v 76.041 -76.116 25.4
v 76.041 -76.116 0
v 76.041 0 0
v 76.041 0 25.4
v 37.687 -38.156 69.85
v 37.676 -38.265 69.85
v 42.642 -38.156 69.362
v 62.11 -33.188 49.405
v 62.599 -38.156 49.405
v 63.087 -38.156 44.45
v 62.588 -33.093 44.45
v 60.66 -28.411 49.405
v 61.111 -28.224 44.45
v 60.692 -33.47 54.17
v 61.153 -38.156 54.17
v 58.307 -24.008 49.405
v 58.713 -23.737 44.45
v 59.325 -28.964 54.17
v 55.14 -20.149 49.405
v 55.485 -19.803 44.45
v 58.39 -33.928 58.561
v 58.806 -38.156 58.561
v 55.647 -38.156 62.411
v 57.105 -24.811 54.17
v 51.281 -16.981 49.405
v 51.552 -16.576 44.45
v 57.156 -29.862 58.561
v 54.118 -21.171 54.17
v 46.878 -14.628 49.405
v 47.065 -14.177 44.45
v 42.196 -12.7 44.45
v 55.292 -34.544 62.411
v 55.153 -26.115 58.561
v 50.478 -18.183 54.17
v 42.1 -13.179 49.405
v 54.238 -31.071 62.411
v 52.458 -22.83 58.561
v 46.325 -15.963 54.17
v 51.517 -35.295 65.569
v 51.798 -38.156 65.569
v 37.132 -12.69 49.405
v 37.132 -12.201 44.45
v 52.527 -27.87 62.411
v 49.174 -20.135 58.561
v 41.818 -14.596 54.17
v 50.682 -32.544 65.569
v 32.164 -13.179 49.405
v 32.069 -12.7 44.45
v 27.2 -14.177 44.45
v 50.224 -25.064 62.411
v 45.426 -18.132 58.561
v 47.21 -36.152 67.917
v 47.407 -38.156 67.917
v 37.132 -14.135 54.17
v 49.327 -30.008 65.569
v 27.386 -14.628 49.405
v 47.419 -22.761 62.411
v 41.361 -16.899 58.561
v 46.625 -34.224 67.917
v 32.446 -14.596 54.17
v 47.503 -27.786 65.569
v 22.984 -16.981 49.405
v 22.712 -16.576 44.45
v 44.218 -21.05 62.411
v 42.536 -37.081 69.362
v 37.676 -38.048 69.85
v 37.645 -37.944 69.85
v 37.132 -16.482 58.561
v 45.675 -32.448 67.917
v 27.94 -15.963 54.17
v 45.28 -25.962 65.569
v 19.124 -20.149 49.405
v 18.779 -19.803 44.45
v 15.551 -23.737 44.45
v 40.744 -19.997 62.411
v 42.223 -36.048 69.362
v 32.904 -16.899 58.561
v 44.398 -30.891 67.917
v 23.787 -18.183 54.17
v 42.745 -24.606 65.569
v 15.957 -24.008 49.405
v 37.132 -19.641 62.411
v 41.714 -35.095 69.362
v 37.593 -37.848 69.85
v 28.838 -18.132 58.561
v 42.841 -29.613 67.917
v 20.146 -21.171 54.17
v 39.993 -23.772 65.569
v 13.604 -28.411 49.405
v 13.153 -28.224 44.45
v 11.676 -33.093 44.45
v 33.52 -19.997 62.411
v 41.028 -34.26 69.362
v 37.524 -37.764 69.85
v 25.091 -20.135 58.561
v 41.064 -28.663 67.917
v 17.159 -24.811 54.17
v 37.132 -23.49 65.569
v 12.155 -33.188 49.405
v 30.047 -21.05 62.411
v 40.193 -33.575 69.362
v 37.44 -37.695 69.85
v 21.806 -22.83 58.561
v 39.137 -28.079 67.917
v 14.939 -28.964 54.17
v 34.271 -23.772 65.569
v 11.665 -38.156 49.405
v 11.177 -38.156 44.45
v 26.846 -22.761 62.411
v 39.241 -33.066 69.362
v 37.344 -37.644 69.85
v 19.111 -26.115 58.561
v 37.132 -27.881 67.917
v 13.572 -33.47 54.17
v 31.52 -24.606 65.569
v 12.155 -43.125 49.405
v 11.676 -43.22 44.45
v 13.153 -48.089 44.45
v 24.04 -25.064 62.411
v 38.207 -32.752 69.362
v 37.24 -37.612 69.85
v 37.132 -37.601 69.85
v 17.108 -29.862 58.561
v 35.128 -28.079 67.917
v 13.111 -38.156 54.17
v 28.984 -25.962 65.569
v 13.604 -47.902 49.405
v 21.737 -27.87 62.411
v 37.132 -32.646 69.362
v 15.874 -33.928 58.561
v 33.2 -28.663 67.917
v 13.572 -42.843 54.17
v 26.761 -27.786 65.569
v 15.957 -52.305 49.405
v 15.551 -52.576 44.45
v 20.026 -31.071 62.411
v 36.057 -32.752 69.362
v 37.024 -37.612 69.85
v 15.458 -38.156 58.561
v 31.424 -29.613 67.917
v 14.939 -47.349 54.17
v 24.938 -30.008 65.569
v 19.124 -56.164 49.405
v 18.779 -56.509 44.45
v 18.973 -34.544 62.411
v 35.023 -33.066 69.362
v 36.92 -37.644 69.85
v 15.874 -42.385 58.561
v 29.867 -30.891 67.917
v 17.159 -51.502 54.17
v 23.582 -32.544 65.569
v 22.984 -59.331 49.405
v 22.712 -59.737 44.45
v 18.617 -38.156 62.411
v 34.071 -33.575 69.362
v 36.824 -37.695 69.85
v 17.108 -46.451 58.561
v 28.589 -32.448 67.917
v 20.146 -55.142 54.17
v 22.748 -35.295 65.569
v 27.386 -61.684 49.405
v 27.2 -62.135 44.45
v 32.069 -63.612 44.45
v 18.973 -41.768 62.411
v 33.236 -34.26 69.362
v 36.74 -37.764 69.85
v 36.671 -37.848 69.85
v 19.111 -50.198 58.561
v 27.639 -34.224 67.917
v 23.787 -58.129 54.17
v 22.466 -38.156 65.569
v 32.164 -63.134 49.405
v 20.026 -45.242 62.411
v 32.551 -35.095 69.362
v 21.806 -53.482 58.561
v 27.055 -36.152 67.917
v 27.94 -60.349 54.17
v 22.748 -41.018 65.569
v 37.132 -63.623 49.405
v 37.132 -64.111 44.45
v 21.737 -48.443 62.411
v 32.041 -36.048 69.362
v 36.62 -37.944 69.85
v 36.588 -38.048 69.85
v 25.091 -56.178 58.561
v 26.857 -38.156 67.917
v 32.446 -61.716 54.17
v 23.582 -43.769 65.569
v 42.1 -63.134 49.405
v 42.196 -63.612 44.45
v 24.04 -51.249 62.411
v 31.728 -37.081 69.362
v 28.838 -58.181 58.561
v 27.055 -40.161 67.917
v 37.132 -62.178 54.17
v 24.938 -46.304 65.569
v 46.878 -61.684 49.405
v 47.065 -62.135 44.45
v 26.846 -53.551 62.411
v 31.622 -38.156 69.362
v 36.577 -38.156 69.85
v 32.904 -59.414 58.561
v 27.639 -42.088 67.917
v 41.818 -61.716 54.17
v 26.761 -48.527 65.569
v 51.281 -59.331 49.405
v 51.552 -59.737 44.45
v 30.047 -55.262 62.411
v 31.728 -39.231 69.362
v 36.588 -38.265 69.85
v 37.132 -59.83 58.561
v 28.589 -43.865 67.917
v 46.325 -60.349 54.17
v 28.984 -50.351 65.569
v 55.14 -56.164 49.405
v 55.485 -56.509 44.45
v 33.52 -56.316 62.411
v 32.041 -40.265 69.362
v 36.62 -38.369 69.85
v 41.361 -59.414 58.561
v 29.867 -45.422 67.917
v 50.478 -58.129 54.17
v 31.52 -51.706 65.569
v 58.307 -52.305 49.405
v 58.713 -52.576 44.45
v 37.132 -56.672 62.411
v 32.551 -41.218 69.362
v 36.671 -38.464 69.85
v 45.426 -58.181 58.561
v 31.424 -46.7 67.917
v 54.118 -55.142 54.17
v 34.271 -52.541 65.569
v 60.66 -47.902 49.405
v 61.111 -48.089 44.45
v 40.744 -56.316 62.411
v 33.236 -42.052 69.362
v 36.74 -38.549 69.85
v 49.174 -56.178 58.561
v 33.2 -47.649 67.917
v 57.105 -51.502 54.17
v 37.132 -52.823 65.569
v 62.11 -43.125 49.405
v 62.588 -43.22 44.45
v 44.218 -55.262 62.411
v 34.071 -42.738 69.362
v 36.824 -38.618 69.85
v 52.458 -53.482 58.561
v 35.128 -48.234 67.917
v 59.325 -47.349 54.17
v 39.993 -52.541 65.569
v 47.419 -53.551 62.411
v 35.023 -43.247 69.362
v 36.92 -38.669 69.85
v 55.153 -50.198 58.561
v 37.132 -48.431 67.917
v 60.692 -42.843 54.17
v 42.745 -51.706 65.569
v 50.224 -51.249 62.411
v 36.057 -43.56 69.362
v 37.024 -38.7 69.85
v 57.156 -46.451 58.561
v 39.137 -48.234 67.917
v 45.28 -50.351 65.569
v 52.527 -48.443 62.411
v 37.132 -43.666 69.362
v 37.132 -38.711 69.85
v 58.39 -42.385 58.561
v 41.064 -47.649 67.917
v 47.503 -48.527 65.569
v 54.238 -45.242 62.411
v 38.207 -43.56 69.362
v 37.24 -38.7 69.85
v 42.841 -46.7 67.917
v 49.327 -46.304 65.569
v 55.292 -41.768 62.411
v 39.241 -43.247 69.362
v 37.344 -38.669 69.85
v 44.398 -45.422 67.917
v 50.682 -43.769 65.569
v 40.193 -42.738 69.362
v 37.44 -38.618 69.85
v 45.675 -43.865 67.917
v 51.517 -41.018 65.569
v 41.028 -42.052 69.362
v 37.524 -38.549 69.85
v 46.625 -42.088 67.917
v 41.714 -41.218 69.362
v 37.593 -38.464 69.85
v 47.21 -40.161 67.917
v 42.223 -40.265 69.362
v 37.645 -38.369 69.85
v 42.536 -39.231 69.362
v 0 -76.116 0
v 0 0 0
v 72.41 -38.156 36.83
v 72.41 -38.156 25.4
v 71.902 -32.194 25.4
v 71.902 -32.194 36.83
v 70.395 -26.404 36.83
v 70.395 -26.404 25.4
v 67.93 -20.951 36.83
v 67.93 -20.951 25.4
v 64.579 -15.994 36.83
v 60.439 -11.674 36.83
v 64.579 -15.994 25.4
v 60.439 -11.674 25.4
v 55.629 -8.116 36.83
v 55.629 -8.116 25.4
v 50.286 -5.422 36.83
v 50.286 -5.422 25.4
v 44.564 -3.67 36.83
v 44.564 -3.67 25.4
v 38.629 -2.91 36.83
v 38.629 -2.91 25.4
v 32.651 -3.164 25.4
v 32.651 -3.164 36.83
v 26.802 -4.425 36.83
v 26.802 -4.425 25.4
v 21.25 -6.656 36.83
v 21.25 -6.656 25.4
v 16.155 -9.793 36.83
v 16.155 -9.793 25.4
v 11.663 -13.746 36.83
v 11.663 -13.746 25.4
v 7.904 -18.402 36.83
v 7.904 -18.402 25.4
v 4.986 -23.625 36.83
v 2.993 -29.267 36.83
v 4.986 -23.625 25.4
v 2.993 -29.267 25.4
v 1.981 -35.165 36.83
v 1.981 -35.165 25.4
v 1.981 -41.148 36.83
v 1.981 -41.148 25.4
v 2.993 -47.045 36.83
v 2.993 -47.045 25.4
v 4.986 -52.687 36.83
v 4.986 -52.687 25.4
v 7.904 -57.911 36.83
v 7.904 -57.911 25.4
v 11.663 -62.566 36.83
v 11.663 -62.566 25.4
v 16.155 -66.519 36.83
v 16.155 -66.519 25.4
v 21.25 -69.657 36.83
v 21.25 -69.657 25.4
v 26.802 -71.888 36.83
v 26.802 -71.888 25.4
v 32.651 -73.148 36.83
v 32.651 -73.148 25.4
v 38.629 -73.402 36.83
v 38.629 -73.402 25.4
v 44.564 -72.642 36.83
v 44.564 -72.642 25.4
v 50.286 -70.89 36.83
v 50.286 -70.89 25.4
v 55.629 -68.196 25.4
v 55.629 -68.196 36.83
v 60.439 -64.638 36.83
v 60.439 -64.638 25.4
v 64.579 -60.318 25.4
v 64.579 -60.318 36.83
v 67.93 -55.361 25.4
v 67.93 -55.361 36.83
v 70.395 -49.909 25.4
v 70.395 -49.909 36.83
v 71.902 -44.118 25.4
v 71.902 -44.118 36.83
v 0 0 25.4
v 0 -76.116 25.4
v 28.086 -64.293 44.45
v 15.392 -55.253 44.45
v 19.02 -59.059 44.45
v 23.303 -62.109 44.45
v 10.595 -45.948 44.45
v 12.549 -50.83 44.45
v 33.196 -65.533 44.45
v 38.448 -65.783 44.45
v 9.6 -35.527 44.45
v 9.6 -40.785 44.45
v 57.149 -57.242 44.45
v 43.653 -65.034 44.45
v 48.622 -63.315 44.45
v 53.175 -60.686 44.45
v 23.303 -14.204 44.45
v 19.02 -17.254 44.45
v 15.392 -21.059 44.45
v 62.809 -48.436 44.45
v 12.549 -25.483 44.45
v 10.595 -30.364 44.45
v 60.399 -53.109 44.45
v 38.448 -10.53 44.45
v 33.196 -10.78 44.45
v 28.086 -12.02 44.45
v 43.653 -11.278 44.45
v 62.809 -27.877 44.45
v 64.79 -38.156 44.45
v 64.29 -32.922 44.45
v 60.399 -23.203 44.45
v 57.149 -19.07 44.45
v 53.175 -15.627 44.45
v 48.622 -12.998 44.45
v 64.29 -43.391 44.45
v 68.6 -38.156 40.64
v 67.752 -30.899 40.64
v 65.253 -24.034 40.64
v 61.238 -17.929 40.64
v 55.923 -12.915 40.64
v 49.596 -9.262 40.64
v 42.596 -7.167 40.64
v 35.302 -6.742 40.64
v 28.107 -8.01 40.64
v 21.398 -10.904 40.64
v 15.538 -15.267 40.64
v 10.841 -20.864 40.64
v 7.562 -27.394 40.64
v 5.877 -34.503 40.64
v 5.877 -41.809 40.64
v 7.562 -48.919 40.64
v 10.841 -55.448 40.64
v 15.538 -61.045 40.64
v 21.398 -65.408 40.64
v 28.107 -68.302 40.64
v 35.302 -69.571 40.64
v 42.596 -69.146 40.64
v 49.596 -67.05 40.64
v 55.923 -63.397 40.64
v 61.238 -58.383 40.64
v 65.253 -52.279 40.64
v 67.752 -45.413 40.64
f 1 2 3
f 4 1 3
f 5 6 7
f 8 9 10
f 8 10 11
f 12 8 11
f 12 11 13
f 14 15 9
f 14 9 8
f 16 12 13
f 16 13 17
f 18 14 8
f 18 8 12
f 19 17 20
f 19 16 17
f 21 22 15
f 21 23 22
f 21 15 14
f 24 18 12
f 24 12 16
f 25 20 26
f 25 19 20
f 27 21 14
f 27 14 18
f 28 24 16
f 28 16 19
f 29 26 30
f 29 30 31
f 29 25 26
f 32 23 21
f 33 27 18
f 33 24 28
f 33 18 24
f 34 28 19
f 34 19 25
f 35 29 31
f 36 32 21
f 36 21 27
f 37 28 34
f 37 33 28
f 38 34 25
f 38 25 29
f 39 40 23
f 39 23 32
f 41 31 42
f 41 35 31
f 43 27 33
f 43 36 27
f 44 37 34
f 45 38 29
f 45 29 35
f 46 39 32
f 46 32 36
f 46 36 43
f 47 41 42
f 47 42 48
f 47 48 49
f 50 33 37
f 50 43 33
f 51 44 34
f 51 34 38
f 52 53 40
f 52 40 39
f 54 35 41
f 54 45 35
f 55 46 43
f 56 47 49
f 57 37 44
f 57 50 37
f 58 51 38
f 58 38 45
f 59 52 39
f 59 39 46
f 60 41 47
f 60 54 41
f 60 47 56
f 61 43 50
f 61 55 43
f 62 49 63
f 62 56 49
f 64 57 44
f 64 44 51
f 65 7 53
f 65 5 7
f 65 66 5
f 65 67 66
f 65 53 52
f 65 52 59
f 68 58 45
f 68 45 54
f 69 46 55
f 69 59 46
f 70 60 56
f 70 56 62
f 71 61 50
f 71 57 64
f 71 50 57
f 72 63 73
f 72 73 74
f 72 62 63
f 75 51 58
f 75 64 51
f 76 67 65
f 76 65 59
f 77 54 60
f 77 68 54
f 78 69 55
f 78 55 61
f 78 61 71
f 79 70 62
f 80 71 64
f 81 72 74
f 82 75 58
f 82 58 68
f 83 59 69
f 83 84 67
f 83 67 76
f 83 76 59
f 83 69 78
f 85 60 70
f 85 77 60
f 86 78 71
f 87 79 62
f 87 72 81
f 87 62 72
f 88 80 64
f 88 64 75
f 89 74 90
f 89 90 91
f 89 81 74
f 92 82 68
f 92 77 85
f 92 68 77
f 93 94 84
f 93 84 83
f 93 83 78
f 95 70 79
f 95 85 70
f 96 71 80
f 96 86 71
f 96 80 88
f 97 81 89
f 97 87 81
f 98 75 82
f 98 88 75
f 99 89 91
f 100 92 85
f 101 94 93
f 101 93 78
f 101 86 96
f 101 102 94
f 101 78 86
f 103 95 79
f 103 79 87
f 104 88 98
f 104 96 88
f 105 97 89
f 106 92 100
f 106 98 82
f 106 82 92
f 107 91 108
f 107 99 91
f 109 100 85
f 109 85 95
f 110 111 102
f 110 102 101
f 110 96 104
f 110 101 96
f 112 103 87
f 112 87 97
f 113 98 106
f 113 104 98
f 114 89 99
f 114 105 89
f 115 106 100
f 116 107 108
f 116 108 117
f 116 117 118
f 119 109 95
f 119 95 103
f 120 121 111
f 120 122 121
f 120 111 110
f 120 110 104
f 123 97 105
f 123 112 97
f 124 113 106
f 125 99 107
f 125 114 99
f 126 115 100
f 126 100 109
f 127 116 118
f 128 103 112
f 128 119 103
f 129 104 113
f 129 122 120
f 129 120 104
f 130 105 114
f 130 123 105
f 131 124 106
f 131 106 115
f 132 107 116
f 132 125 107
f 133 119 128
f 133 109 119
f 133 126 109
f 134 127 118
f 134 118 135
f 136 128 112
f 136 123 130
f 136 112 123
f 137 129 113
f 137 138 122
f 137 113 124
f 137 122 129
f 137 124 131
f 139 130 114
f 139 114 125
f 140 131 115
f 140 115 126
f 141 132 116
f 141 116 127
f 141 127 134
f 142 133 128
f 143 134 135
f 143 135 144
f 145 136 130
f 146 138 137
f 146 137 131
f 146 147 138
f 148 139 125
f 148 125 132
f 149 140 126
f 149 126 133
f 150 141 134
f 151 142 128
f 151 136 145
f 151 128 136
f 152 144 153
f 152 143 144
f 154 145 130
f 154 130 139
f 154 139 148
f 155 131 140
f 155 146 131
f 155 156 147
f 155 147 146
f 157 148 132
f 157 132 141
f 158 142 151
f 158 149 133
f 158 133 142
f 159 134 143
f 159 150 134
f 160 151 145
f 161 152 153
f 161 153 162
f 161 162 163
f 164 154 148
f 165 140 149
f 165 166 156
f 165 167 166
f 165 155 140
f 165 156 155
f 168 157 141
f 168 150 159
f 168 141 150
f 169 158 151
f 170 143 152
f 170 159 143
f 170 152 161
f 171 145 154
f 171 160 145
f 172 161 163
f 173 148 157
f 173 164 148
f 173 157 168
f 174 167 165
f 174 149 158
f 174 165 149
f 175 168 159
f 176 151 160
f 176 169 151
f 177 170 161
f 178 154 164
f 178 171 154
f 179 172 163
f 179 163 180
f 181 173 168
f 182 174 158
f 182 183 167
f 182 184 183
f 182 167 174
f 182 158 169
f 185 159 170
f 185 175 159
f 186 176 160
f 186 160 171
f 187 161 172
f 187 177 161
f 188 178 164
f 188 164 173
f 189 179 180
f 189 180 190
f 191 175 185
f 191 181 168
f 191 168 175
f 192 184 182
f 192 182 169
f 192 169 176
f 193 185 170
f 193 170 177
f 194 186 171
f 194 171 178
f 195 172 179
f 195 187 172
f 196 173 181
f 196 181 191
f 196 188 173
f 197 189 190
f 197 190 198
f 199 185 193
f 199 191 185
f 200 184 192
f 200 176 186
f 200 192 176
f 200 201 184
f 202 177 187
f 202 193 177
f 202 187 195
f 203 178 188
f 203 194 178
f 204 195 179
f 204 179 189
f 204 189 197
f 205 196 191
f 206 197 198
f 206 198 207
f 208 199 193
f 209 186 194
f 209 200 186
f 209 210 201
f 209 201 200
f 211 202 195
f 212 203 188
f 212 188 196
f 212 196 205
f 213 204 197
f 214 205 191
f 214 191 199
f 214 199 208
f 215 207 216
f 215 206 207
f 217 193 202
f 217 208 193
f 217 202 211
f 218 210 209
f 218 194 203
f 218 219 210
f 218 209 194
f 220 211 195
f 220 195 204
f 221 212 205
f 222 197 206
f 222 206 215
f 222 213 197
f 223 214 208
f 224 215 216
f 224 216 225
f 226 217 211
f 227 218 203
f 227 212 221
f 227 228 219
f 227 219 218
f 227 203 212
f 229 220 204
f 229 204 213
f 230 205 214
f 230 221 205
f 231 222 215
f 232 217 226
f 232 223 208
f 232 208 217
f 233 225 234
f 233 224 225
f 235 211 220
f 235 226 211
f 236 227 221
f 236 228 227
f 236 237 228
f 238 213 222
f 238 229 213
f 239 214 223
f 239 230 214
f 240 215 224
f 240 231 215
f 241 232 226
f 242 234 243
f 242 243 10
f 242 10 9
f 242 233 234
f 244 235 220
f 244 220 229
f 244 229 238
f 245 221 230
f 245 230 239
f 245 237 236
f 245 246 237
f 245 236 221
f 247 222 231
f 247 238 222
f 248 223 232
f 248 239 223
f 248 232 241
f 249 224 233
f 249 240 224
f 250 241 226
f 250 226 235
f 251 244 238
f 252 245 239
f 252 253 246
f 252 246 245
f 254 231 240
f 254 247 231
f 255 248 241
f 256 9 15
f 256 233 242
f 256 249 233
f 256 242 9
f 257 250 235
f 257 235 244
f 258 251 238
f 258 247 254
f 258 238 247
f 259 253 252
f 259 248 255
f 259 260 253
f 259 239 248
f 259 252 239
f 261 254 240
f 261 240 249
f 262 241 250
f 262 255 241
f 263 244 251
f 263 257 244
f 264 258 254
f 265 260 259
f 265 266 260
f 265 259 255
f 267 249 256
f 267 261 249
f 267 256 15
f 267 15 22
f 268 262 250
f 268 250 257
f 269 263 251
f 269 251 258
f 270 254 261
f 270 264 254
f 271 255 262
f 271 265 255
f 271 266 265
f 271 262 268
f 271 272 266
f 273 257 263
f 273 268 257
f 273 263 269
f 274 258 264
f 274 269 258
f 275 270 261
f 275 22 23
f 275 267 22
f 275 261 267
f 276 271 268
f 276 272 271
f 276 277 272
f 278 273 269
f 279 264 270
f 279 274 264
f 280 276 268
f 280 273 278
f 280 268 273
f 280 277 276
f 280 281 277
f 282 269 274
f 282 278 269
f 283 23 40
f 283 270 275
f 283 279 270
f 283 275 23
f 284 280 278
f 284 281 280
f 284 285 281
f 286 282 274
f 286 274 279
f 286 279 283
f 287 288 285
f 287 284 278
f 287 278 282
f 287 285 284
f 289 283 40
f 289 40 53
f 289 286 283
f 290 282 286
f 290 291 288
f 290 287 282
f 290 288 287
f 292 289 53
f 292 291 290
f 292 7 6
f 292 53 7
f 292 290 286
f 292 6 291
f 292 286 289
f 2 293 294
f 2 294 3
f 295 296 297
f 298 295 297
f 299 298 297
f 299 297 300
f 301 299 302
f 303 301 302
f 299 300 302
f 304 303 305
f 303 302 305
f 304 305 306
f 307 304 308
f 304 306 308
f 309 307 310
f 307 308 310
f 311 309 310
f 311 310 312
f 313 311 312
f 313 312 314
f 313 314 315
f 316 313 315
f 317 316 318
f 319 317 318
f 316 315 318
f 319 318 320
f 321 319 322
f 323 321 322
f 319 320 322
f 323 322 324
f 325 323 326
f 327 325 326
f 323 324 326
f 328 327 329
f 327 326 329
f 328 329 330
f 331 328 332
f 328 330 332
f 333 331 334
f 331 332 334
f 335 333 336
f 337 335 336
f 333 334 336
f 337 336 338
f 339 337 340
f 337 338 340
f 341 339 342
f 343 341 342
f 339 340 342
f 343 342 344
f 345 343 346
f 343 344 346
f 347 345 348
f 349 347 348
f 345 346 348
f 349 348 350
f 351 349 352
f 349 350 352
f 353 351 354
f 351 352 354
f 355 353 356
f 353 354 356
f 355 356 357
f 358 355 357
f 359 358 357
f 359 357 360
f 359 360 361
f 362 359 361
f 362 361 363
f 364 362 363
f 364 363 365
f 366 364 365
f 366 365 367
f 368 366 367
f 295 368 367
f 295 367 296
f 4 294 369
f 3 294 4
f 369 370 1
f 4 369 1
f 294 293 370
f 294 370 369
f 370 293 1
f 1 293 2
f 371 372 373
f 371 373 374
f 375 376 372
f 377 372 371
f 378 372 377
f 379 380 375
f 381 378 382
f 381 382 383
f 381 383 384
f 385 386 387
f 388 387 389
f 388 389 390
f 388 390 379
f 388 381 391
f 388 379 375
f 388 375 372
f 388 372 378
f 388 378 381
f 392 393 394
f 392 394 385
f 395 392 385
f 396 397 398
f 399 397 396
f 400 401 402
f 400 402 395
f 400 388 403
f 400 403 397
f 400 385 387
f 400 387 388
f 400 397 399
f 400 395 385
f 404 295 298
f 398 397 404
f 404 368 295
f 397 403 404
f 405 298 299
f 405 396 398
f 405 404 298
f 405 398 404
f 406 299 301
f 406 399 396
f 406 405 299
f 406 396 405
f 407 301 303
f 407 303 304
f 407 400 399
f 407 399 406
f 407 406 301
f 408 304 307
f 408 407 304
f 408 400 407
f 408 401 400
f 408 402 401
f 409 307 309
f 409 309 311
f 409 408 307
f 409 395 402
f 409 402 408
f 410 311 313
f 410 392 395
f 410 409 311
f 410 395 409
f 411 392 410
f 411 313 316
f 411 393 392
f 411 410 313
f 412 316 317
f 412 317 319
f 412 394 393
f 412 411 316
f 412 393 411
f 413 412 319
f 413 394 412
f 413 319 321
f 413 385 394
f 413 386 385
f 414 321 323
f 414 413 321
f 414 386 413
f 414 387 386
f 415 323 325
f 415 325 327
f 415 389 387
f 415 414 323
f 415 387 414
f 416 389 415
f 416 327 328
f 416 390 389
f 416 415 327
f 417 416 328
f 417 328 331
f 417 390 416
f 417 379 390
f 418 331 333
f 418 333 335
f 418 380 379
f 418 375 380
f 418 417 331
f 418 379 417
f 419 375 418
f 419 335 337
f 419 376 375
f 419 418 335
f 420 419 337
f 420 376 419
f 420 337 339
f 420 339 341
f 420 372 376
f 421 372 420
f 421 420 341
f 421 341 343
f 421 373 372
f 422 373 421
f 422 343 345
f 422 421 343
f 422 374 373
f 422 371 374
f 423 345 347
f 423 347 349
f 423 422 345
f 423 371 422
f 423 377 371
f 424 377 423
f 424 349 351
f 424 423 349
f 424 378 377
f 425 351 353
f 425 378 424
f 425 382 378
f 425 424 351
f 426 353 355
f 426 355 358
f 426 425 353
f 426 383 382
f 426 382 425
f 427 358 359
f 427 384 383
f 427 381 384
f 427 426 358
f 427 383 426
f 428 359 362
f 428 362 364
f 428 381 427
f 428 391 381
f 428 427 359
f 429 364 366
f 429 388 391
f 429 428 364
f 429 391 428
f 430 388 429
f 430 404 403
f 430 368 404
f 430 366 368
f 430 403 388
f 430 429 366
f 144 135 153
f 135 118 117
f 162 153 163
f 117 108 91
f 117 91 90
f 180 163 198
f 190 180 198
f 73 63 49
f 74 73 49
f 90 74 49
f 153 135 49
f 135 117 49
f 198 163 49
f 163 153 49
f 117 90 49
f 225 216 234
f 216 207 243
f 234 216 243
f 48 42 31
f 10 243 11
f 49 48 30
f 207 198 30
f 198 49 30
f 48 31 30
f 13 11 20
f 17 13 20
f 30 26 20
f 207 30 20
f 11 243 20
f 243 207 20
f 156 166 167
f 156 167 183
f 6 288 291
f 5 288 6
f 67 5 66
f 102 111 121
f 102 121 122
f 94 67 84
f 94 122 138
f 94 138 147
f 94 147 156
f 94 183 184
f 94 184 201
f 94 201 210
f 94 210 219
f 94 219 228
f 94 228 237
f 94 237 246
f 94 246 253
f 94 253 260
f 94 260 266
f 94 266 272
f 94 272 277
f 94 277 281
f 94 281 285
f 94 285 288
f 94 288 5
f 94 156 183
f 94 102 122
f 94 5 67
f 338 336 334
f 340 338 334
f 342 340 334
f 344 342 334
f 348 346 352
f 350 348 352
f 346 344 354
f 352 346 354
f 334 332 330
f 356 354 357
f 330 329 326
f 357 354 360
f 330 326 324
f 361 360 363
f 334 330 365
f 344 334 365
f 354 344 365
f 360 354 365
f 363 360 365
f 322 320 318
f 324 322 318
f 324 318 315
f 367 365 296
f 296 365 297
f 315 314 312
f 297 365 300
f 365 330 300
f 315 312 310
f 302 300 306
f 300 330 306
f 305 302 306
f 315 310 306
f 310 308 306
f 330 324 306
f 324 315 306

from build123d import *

# Parameters (mm, degrees)
F0_W     = 76.0409757495
F0_H     = 76.1161372066
F1_DEPTH = 25.4
F2_R     = 35.2777719823
F3_DEPTH = 19.05
F4_R     = 25.9547927972
F5_DEPTH = 25.4
F6_R     = 25.39999
F7_SIZE  = 7.62


# Not quite as in the source:
# - a fillet or chamfer is up to 0.001 mm smaller than in the source, because OpenCascade refuses the exact size


with BuildPart() as f1:
    # F0 (on Top) → F1 (new body)
    with BuildSketch(Plane.XY):
        with Locations((38.0204878747, -38.0580686033)):
            Rectangle(F0_W, F0_H)
    extrude(amount=F1_DEPTH)


with BuildPart() as f3:
    # F2 (on face) → F3 (new body)
    with BuildSketch(Plane.XY.offset(25.4)):
        with Locations((37.132114172, -38.1562672555)):
            Circle(F2_R)
    extrude(amount=F3_DEPTH)

    # F7
    f7_edges = [f3.edges().sort_by_distance(p)[0] for p in [
        (1.854342, -38.156267, 44.45),
    ]]
    chamfer(f7_edges, length=F7_SIZE)


with BuildPart() as f5:
    # F4 (on face) → F5 (new body)
    with BuildSketch(Plane.XY.offset(44.45)):
        with Locations((37.132114172, -38.1562672555)):
            Circle(F4_R)
    extrude(amount=F5_DEPTH)

    # F6 (radius 25.4 in the source; OpenCascade refuses exactly that, so slightly less here)
    f6_edges = [f5.edges().sort_by_distance(p)[0] for p in [
        (11.177321, -38.156267, 69.85),
    ]]
    fillet(f6_edges, radius=F6_R)


solid = Compound([f1.part, f3.part, f5.part])
